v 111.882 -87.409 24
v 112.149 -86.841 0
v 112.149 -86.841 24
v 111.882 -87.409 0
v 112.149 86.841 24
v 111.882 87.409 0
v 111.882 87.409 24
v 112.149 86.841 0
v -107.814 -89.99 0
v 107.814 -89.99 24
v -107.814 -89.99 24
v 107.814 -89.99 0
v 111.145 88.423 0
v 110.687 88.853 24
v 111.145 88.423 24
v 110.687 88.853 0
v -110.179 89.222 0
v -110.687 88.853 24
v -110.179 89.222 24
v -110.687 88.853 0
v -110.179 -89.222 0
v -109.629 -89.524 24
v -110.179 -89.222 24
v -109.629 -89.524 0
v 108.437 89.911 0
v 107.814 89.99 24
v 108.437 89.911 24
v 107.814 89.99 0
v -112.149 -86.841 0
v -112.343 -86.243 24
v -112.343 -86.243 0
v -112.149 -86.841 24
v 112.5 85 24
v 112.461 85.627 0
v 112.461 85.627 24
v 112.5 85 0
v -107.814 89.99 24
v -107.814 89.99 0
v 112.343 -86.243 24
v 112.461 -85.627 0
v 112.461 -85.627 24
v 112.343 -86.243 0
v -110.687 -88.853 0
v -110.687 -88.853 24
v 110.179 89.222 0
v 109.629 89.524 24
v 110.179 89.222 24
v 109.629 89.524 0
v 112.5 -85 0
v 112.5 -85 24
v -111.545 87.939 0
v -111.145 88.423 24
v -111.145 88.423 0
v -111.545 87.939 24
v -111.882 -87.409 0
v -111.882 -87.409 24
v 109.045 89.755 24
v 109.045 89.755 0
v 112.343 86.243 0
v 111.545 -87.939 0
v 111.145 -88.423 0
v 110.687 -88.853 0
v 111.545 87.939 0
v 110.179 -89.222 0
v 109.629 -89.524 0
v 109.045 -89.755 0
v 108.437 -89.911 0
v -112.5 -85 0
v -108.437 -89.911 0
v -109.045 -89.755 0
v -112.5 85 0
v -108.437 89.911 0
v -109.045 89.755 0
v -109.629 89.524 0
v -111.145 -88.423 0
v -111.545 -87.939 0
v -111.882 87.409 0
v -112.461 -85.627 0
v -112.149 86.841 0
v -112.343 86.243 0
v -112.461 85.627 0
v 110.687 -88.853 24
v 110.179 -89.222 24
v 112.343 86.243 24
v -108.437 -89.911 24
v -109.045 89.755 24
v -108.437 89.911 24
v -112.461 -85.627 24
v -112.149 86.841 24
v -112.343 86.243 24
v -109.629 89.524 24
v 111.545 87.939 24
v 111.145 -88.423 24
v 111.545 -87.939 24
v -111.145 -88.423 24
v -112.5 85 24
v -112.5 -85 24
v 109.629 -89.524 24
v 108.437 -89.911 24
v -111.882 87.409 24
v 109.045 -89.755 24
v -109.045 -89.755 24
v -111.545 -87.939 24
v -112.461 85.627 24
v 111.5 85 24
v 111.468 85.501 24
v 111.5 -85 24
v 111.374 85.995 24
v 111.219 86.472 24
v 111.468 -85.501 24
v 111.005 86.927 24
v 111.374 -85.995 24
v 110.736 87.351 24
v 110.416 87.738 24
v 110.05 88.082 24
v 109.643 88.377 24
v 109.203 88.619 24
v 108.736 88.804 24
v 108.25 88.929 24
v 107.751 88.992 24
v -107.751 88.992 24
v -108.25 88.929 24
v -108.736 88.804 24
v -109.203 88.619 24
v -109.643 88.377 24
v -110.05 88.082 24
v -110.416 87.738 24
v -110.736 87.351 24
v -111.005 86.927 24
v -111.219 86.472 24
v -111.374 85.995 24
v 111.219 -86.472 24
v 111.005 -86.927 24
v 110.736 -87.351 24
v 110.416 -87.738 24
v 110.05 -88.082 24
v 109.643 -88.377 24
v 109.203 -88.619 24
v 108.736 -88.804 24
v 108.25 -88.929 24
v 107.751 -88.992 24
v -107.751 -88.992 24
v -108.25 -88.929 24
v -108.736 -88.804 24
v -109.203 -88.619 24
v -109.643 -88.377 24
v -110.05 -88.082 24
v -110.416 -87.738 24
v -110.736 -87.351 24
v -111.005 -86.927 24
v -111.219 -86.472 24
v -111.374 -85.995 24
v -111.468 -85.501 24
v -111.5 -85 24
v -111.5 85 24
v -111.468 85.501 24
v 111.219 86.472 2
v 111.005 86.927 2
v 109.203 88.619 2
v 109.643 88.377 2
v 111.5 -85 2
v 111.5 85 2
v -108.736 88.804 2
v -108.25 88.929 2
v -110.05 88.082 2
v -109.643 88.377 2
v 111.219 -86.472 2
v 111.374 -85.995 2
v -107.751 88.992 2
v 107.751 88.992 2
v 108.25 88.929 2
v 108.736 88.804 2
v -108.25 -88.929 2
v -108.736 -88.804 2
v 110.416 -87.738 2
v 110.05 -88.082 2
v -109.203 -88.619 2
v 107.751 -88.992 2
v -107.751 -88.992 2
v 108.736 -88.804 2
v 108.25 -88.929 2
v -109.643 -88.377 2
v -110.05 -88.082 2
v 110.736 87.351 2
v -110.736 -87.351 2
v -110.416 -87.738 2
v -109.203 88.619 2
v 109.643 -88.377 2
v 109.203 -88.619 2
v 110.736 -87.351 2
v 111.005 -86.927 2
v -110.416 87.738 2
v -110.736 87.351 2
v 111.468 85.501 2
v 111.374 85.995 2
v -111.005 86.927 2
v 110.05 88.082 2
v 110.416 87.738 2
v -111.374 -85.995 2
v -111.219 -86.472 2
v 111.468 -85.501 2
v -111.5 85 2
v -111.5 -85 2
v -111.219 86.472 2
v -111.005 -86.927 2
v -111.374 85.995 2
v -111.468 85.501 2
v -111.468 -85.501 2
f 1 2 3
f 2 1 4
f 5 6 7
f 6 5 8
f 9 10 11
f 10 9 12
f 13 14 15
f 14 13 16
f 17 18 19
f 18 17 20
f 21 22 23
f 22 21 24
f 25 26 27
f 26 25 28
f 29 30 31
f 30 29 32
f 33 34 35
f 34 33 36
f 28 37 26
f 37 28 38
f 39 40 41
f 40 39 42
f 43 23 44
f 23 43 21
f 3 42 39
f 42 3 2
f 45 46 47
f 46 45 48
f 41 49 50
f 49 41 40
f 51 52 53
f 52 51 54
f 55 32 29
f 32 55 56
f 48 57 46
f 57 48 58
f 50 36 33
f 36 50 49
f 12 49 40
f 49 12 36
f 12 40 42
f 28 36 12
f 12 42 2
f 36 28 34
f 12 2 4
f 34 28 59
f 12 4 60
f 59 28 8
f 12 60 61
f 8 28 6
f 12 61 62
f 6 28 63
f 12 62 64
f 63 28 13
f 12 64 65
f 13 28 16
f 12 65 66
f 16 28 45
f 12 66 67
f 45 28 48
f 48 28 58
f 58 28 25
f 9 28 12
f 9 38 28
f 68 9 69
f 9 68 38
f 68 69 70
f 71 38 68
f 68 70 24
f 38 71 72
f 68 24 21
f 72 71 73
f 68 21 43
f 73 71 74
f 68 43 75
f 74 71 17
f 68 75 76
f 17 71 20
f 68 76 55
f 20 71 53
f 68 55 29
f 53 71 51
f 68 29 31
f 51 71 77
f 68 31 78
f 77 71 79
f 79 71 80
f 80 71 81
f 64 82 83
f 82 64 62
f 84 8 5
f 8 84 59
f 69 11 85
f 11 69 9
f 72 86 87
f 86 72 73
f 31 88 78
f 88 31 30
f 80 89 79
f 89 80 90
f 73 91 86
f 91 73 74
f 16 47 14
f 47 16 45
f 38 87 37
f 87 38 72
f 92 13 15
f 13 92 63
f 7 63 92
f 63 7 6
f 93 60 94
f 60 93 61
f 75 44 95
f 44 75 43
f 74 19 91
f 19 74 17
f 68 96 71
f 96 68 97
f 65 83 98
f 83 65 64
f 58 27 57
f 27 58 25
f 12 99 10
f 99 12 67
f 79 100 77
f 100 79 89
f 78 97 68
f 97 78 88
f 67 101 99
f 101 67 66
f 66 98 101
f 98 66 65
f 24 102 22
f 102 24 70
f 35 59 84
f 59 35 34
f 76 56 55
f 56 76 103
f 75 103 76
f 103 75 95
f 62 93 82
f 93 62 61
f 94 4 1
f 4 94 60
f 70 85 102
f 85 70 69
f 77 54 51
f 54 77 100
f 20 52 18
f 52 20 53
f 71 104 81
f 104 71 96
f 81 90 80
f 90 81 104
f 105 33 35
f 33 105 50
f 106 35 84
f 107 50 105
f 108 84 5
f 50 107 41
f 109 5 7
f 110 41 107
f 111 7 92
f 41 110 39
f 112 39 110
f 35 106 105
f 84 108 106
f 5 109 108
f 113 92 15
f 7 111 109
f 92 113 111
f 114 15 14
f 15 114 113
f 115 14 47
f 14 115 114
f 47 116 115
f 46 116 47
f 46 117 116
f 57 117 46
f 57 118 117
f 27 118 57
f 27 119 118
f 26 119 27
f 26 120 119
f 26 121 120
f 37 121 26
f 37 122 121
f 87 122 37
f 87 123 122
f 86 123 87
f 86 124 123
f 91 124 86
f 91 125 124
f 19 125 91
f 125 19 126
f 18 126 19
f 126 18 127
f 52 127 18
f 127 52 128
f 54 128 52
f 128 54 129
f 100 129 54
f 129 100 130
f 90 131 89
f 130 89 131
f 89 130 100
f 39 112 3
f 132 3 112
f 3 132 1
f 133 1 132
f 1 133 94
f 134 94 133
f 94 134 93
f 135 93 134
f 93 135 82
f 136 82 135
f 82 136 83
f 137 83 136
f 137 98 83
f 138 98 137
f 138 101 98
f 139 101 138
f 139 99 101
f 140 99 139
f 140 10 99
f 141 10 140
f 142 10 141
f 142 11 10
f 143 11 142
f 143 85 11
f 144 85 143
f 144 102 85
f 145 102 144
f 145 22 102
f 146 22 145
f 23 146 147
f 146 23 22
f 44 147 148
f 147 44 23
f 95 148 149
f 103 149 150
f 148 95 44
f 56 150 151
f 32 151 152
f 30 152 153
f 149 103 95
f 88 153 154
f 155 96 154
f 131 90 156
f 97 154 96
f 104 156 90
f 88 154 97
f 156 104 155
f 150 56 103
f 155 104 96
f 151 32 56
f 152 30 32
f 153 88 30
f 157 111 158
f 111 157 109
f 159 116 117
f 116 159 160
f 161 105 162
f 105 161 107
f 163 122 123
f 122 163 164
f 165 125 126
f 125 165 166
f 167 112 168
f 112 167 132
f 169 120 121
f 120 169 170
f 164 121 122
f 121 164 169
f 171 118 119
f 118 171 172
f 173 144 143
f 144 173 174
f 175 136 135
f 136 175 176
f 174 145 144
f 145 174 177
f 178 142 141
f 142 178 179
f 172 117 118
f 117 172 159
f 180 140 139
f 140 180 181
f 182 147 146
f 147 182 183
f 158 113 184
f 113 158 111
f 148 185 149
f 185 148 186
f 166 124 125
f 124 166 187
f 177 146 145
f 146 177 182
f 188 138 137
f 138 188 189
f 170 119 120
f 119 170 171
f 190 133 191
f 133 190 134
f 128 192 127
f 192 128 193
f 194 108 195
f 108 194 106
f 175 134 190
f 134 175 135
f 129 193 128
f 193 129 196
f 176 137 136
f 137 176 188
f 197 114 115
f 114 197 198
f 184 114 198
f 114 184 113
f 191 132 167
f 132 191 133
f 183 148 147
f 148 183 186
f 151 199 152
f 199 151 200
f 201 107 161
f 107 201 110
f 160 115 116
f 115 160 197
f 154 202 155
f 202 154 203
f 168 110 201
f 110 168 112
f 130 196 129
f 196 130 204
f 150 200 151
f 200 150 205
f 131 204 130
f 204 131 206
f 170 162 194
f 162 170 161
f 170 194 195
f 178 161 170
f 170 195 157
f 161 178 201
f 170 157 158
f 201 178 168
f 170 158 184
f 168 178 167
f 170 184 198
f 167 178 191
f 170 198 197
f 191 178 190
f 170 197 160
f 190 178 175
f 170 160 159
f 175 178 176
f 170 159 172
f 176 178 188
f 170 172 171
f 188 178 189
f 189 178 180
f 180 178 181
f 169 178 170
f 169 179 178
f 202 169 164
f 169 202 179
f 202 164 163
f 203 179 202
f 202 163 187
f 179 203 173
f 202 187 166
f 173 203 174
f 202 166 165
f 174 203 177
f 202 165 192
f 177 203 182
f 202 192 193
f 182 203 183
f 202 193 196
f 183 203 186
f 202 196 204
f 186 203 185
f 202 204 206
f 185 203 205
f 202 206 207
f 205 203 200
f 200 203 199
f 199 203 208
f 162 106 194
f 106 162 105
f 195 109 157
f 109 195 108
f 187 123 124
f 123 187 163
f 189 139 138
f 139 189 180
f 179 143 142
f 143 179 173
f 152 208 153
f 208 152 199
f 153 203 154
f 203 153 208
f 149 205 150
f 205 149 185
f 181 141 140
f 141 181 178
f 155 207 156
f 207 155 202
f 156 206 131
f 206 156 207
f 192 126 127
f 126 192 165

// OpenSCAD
$fn = 50;


difference() {
	union() {
		hull() {
			translate(v = [-107.5000000000, 85.0000000000, 0]) {
				cylinder(h = 24, r = 5);
			}
			translate(v = [107.5000000000, 85.0000000000, 0]) {
				cylinder(h = 24, r = 5);
			}
			translate(v = [-107.5000000000, -85.0000000000, 0]) {
				cylinder(h = 24, r = 5);
			}
			translate(v = [107.5000000000, -85.0000000000, 0]) {
				cylinder(h = 24, r = 5);
			}
		}
	}
	union() {
		translate(v = [0, 0, 2]) {
			hull() {
				translate(v = [-107.5000000000, 85.0000000000, 0]) {
					cylinder(h = 22, r = 4);
				}
				translate(v = [107.5000000000, 85.0000000000, 0]) {
					cylinder(h = 22, r = 4);
				}
				translate(v = [-107.5000000000, -85.0000000000, 0]) {
					cylinder(h = 22, r = 4);
				}
				translate(v = [107.5000000000, -85.0000000000, 0]) {
					cylinder(h = 22, r = 4);
				}
			}
		}
	}
}
